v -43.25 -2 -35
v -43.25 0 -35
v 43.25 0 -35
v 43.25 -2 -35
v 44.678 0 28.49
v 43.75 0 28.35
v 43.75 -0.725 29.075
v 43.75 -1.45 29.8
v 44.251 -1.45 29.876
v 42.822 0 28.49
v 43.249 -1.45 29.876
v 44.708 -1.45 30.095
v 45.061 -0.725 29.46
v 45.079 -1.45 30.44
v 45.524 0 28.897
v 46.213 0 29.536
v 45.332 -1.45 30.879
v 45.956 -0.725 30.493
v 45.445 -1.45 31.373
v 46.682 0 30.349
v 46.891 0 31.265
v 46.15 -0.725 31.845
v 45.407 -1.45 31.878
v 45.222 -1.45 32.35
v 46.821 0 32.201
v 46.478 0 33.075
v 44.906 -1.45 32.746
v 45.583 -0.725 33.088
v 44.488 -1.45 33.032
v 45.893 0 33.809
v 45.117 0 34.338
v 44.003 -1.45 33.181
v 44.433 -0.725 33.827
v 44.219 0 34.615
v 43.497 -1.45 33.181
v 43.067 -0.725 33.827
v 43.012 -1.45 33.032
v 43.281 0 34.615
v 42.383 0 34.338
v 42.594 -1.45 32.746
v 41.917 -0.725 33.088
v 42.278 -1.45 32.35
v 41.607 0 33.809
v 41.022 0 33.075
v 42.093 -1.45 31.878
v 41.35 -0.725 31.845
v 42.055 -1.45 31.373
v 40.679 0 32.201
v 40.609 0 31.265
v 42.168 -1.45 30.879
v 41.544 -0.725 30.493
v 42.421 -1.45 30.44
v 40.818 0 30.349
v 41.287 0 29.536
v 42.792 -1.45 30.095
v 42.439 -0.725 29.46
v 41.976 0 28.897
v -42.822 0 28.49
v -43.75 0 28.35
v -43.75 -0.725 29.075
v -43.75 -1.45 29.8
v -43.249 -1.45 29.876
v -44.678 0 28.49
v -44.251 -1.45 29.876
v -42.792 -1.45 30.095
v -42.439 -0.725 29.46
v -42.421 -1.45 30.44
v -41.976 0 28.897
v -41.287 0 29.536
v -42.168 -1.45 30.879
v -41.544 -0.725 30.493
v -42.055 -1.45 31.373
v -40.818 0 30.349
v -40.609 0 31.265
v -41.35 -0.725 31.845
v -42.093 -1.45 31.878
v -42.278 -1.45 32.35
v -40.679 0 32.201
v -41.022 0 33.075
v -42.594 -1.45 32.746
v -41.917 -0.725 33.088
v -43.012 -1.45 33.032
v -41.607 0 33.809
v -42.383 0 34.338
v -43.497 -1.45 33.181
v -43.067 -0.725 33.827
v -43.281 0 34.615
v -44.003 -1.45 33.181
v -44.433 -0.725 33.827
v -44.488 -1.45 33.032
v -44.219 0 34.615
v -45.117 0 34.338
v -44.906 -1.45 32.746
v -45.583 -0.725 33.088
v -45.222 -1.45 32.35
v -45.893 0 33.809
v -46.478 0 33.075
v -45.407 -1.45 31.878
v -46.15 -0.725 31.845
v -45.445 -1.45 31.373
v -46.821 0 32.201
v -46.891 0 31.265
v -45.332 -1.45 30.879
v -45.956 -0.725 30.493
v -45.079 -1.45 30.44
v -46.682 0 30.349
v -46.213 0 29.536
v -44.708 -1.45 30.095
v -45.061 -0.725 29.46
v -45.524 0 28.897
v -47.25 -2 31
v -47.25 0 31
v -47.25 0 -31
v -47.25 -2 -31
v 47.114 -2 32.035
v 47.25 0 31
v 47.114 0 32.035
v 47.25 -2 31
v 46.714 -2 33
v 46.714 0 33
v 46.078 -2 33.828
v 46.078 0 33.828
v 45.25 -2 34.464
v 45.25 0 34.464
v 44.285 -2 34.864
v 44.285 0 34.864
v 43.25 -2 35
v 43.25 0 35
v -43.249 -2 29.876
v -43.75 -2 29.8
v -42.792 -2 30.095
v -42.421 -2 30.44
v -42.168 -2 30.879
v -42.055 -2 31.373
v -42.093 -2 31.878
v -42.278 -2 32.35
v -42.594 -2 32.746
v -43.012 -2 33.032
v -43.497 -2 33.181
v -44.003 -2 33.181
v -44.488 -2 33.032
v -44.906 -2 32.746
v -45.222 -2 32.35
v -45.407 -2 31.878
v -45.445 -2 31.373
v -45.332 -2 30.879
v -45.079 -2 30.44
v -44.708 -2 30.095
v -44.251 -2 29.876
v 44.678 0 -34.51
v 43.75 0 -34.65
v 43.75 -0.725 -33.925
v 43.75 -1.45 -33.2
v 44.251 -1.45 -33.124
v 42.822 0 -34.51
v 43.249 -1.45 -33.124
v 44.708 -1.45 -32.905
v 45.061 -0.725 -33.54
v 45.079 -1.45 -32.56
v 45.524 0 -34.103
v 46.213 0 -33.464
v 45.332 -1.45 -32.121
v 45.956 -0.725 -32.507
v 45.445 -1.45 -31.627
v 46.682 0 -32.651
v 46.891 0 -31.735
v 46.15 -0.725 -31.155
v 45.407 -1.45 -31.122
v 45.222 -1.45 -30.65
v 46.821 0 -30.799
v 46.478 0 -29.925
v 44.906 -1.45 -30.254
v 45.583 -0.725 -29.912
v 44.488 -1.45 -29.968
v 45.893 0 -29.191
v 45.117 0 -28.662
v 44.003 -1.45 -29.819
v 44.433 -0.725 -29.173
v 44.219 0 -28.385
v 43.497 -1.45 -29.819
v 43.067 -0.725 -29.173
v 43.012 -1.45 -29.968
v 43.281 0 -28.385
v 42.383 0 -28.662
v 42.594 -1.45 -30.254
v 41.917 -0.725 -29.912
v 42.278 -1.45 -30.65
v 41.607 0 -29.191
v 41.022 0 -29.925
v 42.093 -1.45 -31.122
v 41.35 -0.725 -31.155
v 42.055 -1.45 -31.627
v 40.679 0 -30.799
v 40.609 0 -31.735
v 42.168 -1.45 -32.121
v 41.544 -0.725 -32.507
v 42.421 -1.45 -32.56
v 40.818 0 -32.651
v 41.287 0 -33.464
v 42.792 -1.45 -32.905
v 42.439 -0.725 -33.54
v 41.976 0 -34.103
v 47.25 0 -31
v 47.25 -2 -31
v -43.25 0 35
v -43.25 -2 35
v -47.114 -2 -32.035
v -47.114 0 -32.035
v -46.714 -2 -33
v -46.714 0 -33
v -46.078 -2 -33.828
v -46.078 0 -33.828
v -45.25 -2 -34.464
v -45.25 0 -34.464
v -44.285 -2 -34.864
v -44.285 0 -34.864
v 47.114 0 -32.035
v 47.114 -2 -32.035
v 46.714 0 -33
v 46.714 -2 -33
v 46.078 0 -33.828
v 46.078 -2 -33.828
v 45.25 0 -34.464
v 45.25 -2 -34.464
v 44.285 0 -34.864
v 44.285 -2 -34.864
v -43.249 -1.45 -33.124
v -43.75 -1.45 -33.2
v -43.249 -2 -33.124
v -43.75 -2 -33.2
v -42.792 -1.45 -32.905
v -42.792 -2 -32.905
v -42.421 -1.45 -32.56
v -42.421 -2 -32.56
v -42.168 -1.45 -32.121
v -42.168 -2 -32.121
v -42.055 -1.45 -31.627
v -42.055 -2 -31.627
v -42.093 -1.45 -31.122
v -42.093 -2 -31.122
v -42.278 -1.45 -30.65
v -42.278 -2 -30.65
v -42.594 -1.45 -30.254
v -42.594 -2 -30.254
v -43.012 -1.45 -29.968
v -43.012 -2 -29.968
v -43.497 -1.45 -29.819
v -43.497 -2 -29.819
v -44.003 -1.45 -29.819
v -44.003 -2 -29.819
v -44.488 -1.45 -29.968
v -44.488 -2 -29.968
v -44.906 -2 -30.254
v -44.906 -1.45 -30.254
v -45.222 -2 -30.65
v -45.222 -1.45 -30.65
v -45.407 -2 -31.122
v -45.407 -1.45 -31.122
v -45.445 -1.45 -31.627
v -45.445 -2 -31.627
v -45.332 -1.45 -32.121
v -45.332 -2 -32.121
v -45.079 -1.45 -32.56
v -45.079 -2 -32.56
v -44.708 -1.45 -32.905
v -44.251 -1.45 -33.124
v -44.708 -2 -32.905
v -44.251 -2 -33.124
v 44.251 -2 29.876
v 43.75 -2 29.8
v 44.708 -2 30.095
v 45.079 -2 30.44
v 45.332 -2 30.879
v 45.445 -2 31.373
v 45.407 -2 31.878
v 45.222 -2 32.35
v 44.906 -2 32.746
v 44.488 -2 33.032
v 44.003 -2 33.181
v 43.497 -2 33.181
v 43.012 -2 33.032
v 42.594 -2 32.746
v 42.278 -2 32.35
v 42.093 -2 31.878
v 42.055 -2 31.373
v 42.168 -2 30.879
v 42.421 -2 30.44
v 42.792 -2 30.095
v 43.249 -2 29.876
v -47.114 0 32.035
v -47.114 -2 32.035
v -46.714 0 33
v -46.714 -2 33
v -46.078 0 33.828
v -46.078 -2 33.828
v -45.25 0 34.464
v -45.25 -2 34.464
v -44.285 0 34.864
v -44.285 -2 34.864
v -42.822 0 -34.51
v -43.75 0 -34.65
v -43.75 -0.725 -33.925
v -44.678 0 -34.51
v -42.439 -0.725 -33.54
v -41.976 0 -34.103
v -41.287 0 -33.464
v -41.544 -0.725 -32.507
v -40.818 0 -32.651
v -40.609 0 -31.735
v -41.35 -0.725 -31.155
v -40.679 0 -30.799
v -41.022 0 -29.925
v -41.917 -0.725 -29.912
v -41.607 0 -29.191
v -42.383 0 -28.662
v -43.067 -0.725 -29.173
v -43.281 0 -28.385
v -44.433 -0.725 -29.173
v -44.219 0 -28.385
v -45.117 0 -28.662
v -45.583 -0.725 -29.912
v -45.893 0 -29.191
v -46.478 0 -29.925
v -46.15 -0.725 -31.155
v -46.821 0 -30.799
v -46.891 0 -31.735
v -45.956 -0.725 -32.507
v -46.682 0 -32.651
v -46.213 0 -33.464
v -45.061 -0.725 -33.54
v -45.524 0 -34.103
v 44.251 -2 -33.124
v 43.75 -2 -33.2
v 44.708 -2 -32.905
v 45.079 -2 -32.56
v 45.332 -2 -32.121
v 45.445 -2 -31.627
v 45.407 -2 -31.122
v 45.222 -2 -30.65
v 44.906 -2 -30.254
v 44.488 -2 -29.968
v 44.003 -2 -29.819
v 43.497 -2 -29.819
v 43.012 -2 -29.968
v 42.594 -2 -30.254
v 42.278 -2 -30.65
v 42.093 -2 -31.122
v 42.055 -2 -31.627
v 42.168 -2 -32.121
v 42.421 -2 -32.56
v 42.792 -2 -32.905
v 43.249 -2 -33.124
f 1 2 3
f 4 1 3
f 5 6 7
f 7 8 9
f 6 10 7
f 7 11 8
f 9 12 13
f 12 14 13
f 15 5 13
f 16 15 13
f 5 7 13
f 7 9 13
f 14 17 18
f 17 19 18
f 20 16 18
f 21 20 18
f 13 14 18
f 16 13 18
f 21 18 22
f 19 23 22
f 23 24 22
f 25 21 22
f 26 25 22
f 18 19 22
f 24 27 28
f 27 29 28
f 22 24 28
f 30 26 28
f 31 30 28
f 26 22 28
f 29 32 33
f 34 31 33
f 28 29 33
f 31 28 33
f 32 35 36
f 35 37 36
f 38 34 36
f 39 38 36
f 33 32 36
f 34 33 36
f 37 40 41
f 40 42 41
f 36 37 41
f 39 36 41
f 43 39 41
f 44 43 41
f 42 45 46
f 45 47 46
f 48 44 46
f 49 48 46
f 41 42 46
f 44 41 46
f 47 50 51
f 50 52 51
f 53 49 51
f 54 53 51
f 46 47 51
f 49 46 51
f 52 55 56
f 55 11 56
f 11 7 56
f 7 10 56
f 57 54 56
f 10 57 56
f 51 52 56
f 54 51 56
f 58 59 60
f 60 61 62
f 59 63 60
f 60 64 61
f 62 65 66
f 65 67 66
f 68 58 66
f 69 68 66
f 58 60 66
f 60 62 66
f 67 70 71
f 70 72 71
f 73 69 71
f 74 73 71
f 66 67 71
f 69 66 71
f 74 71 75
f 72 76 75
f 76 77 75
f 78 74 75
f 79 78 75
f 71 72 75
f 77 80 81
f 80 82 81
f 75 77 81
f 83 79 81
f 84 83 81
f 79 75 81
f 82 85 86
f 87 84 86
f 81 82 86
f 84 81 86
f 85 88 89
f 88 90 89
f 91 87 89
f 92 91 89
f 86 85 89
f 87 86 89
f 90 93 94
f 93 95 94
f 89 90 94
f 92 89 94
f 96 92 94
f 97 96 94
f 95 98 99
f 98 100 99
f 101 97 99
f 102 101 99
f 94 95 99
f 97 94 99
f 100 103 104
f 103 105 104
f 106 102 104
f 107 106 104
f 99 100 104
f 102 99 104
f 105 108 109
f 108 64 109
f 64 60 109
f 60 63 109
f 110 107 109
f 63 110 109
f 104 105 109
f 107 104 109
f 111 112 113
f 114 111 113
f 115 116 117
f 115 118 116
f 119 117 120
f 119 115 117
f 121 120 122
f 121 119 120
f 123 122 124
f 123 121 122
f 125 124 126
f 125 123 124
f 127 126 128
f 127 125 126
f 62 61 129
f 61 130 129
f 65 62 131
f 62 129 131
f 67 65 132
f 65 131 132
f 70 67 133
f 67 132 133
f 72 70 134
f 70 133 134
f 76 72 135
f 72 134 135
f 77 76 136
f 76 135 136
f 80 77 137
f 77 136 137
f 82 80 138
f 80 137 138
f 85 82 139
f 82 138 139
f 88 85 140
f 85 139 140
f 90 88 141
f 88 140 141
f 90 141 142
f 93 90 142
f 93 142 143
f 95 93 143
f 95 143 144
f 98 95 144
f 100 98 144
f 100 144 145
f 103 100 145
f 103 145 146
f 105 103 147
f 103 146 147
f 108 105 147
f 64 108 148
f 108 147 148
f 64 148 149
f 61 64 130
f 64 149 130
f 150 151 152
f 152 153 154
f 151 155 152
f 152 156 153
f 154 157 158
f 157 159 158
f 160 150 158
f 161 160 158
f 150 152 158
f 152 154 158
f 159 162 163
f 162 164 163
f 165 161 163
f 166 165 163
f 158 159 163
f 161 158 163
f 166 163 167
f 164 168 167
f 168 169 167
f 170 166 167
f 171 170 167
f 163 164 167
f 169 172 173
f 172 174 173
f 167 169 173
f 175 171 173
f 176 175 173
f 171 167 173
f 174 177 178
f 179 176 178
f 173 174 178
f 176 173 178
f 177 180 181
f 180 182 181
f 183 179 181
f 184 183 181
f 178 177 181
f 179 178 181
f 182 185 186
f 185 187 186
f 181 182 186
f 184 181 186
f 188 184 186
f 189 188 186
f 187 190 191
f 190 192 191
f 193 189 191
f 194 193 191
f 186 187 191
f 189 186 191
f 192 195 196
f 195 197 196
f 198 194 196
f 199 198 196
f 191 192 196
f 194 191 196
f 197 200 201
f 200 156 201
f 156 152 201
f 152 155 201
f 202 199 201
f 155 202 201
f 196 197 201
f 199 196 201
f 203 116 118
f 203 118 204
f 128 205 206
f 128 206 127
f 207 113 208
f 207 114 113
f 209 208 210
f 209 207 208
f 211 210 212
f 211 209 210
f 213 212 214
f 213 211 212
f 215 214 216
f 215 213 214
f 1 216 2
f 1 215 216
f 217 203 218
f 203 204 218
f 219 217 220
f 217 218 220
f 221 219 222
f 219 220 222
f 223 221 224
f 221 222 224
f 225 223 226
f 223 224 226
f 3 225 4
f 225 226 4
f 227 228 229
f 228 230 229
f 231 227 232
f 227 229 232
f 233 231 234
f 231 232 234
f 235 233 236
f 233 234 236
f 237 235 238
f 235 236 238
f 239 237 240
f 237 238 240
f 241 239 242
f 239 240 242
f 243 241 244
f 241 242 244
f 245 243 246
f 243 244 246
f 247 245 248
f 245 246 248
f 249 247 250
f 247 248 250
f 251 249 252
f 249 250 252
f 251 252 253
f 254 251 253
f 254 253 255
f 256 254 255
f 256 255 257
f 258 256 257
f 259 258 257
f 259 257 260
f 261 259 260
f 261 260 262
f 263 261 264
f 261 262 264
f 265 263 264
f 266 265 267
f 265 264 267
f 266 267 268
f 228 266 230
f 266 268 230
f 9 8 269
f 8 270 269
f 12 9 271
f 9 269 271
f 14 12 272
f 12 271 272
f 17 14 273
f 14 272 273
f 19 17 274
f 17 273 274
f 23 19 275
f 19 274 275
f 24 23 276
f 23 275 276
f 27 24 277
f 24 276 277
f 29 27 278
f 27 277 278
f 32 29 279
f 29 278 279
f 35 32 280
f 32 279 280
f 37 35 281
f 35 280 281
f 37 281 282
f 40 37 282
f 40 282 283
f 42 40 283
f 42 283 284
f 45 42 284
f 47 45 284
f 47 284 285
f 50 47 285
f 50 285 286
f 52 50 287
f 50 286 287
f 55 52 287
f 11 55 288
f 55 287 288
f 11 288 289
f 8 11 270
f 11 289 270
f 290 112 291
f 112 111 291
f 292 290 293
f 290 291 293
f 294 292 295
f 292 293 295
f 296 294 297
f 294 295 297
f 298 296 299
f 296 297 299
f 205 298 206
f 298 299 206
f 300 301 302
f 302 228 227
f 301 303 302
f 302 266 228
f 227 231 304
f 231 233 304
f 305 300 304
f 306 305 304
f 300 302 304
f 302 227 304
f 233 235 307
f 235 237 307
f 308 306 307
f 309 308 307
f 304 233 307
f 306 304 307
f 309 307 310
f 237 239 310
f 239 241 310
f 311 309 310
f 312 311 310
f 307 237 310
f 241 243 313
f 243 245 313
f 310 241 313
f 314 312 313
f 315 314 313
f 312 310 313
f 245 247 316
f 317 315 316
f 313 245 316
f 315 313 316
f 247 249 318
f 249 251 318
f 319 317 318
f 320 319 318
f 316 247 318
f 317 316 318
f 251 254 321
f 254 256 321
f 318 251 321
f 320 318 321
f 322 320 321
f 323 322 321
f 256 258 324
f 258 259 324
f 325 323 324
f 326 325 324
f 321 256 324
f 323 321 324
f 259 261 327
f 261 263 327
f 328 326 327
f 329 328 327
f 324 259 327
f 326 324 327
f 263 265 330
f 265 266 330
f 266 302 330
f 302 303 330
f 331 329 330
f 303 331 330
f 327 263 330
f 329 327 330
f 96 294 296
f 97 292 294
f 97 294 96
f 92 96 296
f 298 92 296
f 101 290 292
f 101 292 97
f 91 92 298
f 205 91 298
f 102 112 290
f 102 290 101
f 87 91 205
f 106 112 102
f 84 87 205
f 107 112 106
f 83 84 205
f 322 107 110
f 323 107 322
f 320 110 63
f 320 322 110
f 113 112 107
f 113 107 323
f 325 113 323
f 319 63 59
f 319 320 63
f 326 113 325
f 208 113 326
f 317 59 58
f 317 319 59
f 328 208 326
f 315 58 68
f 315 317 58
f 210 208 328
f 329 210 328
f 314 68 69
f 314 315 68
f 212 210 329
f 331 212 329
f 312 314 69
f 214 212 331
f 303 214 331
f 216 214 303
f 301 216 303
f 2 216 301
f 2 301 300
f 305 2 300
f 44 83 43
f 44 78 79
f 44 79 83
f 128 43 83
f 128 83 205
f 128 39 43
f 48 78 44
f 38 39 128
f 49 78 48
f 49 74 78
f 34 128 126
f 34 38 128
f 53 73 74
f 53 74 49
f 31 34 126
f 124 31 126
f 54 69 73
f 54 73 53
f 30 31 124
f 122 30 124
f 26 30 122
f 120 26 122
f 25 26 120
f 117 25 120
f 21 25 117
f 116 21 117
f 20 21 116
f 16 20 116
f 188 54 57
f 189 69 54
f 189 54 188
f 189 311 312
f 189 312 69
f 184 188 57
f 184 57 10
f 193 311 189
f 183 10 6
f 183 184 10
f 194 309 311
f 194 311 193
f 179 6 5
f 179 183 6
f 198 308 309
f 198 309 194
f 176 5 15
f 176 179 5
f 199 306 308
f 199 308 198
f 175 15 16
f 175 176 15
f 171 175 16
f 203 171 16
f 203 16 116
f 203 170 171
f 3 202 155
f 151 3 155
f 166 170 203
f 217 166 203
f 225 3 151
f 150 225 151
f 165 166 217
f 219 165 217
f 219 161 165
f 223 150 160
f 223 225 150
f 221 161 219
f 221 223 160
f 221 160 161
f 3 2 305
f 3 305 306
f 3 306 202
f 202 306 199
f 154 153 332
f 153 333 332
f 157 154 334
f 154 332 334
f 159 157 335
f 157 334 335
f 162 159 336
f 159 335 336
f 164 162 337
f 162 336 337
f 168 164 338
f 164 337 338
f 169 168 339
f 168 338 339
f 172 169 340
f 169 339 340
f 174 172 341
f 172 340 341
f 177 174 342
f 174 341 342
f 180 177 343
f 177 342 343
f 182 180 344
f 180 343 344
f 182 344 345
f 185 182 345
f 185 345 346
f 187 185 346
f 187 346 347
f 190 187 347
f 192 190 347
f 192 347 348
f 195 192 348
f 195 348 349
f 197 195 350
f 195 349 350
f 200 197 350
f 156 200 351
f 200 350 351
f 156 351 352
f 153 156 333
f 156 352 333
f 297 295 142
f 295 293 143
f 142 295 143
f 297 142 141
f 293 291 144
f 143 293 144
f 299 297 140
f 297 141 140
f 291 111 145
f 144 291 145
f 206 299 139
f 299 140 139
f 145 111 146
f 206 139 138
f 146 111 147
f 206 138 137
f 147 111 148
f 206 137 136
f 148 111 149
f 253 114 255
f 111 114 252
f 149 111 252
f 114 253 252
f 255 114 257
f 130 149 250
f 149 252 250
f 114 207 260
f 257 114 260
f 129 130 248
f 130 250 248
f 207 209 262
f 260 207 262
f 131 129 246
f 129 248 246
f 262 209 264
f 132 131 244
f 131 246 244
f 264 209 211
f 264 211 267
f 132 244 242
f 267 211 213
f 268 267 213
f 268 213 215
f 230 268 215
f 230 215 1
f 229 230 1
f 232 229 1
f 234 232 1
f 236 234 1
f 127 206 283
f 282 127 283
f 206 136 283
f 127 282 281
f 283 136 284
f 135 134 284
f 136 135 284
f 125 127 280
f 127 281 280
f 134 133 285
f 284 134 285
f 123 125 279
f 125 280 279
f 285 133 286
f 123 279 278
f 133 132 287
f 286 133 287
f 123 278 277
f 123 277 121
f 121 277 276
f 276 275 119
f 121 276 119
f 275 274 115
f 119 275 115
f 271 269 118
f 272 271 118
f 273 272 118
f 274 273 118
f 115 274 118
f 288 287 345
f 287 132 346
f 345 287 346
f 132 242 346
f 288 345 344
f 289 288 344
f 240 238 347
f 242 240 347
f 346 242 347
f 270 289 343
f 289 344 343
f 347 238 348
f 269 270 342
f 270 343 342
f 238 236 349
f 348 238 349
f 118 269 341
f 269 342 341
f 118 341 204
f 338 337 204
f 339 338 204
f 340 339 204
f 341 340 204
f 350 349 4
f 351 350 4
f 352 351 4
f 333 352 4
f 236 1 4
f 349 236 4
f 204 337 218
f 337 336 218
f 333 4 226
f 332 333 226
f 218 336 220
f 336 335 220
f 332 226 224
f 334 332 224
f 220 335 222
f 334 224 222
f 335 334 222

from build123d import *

# Parameters (mm, degrees)
SKETCH1_W                                       = 94.5
SKETCH1_H                                       = 70
BOSS_EXTRUDE1_DEPTH                             = 2
CSK_FOR_M3_FLAT_HEAD_MACHINE_SCREW1_D           = 3.4
CSK_FOR_M3_FLAT_HEAD_MACHINE_SCREW1_DEPTH       = 30
CSK_FOR_M3_FLAT_HEAD_MACHINE_SCREW1_CSINK_D     = 6.3
CSK_FOR_M3_FLAT_HEAD_MACHINE_SCREW1_CSINK_ANGLE = 90
CSK_FOR_M3_FLAT_HEAD_MACHINE_SCREW1_TIP         = 1.021463052
FILLET1_R                                       = 4


with BuildPart() as part:
    # Sketch1 → Boss-Extrude1 (new body)
    with BuildSketch(Plane(origin=(0, 0, 0), x_dir=(1, 0, 0), z_dir=(0, 1, 0))):
        Rectangle(SKETCH1_W, SKETCH1_H)
    extrude(amount=-BOSS_EXTRUDE1_DEPTH)

    # CSK for M3 Flat Head Machine Screw1
    with Locations(Plane(origin=(-43.75, 0, -31.5), x_dir=(0, 0, 1), z_dir=(0, 1, 0))):
        with Locations((0, 0), (0, 87.5), (63, 87.5), (63, 0)):
            CounterSinkHole(CSK_FOR_M3_FLAT_HEAD_MACHINE_SCREW1_D / 2, CSK_FOR_M3_FLAT_HEAD_MACHINE_SCREW1_CSINK_D / 2, depth=CSK_FOR_M3_FLAT_HEAD_MACHINE_SCREW1_DEPTH, counter_sink_angle=CSK_FOR_M3_FLAT_HEAD_MACHINE_SCREW1_CSINK_ANGLE)
            with Locations((0, 0, -(CSK_FOR_M3_FLAT_HEAD_MACHINE_SCREW1_DEPTH + CSK_FOR_M3_FLAT_HEAD_MACHINE_SCREW1_TIP / 2))):  # 118° drill point
                Cone(0, CSK_FOR_M3_FLAT_HEAD_MACHINE_SCREW1_D / 2, CSK_FOR_M3_FLAT_HEAD_MACHINE_SCREW1_TIP, mode=Mode.SUBTRACT)

    # Fillet1
    fillet1_edges = [part.edges().sort_by_distance(p)[0] for p in [
        (47.25, -1, 35),
        (-47.25, -1, 35),
        (-47.25, -1, -35),
        (47.25, -1, -35),
    ]]
    fillet(fillet1_edges, radius=FILLET1_R)


solid = part.part
